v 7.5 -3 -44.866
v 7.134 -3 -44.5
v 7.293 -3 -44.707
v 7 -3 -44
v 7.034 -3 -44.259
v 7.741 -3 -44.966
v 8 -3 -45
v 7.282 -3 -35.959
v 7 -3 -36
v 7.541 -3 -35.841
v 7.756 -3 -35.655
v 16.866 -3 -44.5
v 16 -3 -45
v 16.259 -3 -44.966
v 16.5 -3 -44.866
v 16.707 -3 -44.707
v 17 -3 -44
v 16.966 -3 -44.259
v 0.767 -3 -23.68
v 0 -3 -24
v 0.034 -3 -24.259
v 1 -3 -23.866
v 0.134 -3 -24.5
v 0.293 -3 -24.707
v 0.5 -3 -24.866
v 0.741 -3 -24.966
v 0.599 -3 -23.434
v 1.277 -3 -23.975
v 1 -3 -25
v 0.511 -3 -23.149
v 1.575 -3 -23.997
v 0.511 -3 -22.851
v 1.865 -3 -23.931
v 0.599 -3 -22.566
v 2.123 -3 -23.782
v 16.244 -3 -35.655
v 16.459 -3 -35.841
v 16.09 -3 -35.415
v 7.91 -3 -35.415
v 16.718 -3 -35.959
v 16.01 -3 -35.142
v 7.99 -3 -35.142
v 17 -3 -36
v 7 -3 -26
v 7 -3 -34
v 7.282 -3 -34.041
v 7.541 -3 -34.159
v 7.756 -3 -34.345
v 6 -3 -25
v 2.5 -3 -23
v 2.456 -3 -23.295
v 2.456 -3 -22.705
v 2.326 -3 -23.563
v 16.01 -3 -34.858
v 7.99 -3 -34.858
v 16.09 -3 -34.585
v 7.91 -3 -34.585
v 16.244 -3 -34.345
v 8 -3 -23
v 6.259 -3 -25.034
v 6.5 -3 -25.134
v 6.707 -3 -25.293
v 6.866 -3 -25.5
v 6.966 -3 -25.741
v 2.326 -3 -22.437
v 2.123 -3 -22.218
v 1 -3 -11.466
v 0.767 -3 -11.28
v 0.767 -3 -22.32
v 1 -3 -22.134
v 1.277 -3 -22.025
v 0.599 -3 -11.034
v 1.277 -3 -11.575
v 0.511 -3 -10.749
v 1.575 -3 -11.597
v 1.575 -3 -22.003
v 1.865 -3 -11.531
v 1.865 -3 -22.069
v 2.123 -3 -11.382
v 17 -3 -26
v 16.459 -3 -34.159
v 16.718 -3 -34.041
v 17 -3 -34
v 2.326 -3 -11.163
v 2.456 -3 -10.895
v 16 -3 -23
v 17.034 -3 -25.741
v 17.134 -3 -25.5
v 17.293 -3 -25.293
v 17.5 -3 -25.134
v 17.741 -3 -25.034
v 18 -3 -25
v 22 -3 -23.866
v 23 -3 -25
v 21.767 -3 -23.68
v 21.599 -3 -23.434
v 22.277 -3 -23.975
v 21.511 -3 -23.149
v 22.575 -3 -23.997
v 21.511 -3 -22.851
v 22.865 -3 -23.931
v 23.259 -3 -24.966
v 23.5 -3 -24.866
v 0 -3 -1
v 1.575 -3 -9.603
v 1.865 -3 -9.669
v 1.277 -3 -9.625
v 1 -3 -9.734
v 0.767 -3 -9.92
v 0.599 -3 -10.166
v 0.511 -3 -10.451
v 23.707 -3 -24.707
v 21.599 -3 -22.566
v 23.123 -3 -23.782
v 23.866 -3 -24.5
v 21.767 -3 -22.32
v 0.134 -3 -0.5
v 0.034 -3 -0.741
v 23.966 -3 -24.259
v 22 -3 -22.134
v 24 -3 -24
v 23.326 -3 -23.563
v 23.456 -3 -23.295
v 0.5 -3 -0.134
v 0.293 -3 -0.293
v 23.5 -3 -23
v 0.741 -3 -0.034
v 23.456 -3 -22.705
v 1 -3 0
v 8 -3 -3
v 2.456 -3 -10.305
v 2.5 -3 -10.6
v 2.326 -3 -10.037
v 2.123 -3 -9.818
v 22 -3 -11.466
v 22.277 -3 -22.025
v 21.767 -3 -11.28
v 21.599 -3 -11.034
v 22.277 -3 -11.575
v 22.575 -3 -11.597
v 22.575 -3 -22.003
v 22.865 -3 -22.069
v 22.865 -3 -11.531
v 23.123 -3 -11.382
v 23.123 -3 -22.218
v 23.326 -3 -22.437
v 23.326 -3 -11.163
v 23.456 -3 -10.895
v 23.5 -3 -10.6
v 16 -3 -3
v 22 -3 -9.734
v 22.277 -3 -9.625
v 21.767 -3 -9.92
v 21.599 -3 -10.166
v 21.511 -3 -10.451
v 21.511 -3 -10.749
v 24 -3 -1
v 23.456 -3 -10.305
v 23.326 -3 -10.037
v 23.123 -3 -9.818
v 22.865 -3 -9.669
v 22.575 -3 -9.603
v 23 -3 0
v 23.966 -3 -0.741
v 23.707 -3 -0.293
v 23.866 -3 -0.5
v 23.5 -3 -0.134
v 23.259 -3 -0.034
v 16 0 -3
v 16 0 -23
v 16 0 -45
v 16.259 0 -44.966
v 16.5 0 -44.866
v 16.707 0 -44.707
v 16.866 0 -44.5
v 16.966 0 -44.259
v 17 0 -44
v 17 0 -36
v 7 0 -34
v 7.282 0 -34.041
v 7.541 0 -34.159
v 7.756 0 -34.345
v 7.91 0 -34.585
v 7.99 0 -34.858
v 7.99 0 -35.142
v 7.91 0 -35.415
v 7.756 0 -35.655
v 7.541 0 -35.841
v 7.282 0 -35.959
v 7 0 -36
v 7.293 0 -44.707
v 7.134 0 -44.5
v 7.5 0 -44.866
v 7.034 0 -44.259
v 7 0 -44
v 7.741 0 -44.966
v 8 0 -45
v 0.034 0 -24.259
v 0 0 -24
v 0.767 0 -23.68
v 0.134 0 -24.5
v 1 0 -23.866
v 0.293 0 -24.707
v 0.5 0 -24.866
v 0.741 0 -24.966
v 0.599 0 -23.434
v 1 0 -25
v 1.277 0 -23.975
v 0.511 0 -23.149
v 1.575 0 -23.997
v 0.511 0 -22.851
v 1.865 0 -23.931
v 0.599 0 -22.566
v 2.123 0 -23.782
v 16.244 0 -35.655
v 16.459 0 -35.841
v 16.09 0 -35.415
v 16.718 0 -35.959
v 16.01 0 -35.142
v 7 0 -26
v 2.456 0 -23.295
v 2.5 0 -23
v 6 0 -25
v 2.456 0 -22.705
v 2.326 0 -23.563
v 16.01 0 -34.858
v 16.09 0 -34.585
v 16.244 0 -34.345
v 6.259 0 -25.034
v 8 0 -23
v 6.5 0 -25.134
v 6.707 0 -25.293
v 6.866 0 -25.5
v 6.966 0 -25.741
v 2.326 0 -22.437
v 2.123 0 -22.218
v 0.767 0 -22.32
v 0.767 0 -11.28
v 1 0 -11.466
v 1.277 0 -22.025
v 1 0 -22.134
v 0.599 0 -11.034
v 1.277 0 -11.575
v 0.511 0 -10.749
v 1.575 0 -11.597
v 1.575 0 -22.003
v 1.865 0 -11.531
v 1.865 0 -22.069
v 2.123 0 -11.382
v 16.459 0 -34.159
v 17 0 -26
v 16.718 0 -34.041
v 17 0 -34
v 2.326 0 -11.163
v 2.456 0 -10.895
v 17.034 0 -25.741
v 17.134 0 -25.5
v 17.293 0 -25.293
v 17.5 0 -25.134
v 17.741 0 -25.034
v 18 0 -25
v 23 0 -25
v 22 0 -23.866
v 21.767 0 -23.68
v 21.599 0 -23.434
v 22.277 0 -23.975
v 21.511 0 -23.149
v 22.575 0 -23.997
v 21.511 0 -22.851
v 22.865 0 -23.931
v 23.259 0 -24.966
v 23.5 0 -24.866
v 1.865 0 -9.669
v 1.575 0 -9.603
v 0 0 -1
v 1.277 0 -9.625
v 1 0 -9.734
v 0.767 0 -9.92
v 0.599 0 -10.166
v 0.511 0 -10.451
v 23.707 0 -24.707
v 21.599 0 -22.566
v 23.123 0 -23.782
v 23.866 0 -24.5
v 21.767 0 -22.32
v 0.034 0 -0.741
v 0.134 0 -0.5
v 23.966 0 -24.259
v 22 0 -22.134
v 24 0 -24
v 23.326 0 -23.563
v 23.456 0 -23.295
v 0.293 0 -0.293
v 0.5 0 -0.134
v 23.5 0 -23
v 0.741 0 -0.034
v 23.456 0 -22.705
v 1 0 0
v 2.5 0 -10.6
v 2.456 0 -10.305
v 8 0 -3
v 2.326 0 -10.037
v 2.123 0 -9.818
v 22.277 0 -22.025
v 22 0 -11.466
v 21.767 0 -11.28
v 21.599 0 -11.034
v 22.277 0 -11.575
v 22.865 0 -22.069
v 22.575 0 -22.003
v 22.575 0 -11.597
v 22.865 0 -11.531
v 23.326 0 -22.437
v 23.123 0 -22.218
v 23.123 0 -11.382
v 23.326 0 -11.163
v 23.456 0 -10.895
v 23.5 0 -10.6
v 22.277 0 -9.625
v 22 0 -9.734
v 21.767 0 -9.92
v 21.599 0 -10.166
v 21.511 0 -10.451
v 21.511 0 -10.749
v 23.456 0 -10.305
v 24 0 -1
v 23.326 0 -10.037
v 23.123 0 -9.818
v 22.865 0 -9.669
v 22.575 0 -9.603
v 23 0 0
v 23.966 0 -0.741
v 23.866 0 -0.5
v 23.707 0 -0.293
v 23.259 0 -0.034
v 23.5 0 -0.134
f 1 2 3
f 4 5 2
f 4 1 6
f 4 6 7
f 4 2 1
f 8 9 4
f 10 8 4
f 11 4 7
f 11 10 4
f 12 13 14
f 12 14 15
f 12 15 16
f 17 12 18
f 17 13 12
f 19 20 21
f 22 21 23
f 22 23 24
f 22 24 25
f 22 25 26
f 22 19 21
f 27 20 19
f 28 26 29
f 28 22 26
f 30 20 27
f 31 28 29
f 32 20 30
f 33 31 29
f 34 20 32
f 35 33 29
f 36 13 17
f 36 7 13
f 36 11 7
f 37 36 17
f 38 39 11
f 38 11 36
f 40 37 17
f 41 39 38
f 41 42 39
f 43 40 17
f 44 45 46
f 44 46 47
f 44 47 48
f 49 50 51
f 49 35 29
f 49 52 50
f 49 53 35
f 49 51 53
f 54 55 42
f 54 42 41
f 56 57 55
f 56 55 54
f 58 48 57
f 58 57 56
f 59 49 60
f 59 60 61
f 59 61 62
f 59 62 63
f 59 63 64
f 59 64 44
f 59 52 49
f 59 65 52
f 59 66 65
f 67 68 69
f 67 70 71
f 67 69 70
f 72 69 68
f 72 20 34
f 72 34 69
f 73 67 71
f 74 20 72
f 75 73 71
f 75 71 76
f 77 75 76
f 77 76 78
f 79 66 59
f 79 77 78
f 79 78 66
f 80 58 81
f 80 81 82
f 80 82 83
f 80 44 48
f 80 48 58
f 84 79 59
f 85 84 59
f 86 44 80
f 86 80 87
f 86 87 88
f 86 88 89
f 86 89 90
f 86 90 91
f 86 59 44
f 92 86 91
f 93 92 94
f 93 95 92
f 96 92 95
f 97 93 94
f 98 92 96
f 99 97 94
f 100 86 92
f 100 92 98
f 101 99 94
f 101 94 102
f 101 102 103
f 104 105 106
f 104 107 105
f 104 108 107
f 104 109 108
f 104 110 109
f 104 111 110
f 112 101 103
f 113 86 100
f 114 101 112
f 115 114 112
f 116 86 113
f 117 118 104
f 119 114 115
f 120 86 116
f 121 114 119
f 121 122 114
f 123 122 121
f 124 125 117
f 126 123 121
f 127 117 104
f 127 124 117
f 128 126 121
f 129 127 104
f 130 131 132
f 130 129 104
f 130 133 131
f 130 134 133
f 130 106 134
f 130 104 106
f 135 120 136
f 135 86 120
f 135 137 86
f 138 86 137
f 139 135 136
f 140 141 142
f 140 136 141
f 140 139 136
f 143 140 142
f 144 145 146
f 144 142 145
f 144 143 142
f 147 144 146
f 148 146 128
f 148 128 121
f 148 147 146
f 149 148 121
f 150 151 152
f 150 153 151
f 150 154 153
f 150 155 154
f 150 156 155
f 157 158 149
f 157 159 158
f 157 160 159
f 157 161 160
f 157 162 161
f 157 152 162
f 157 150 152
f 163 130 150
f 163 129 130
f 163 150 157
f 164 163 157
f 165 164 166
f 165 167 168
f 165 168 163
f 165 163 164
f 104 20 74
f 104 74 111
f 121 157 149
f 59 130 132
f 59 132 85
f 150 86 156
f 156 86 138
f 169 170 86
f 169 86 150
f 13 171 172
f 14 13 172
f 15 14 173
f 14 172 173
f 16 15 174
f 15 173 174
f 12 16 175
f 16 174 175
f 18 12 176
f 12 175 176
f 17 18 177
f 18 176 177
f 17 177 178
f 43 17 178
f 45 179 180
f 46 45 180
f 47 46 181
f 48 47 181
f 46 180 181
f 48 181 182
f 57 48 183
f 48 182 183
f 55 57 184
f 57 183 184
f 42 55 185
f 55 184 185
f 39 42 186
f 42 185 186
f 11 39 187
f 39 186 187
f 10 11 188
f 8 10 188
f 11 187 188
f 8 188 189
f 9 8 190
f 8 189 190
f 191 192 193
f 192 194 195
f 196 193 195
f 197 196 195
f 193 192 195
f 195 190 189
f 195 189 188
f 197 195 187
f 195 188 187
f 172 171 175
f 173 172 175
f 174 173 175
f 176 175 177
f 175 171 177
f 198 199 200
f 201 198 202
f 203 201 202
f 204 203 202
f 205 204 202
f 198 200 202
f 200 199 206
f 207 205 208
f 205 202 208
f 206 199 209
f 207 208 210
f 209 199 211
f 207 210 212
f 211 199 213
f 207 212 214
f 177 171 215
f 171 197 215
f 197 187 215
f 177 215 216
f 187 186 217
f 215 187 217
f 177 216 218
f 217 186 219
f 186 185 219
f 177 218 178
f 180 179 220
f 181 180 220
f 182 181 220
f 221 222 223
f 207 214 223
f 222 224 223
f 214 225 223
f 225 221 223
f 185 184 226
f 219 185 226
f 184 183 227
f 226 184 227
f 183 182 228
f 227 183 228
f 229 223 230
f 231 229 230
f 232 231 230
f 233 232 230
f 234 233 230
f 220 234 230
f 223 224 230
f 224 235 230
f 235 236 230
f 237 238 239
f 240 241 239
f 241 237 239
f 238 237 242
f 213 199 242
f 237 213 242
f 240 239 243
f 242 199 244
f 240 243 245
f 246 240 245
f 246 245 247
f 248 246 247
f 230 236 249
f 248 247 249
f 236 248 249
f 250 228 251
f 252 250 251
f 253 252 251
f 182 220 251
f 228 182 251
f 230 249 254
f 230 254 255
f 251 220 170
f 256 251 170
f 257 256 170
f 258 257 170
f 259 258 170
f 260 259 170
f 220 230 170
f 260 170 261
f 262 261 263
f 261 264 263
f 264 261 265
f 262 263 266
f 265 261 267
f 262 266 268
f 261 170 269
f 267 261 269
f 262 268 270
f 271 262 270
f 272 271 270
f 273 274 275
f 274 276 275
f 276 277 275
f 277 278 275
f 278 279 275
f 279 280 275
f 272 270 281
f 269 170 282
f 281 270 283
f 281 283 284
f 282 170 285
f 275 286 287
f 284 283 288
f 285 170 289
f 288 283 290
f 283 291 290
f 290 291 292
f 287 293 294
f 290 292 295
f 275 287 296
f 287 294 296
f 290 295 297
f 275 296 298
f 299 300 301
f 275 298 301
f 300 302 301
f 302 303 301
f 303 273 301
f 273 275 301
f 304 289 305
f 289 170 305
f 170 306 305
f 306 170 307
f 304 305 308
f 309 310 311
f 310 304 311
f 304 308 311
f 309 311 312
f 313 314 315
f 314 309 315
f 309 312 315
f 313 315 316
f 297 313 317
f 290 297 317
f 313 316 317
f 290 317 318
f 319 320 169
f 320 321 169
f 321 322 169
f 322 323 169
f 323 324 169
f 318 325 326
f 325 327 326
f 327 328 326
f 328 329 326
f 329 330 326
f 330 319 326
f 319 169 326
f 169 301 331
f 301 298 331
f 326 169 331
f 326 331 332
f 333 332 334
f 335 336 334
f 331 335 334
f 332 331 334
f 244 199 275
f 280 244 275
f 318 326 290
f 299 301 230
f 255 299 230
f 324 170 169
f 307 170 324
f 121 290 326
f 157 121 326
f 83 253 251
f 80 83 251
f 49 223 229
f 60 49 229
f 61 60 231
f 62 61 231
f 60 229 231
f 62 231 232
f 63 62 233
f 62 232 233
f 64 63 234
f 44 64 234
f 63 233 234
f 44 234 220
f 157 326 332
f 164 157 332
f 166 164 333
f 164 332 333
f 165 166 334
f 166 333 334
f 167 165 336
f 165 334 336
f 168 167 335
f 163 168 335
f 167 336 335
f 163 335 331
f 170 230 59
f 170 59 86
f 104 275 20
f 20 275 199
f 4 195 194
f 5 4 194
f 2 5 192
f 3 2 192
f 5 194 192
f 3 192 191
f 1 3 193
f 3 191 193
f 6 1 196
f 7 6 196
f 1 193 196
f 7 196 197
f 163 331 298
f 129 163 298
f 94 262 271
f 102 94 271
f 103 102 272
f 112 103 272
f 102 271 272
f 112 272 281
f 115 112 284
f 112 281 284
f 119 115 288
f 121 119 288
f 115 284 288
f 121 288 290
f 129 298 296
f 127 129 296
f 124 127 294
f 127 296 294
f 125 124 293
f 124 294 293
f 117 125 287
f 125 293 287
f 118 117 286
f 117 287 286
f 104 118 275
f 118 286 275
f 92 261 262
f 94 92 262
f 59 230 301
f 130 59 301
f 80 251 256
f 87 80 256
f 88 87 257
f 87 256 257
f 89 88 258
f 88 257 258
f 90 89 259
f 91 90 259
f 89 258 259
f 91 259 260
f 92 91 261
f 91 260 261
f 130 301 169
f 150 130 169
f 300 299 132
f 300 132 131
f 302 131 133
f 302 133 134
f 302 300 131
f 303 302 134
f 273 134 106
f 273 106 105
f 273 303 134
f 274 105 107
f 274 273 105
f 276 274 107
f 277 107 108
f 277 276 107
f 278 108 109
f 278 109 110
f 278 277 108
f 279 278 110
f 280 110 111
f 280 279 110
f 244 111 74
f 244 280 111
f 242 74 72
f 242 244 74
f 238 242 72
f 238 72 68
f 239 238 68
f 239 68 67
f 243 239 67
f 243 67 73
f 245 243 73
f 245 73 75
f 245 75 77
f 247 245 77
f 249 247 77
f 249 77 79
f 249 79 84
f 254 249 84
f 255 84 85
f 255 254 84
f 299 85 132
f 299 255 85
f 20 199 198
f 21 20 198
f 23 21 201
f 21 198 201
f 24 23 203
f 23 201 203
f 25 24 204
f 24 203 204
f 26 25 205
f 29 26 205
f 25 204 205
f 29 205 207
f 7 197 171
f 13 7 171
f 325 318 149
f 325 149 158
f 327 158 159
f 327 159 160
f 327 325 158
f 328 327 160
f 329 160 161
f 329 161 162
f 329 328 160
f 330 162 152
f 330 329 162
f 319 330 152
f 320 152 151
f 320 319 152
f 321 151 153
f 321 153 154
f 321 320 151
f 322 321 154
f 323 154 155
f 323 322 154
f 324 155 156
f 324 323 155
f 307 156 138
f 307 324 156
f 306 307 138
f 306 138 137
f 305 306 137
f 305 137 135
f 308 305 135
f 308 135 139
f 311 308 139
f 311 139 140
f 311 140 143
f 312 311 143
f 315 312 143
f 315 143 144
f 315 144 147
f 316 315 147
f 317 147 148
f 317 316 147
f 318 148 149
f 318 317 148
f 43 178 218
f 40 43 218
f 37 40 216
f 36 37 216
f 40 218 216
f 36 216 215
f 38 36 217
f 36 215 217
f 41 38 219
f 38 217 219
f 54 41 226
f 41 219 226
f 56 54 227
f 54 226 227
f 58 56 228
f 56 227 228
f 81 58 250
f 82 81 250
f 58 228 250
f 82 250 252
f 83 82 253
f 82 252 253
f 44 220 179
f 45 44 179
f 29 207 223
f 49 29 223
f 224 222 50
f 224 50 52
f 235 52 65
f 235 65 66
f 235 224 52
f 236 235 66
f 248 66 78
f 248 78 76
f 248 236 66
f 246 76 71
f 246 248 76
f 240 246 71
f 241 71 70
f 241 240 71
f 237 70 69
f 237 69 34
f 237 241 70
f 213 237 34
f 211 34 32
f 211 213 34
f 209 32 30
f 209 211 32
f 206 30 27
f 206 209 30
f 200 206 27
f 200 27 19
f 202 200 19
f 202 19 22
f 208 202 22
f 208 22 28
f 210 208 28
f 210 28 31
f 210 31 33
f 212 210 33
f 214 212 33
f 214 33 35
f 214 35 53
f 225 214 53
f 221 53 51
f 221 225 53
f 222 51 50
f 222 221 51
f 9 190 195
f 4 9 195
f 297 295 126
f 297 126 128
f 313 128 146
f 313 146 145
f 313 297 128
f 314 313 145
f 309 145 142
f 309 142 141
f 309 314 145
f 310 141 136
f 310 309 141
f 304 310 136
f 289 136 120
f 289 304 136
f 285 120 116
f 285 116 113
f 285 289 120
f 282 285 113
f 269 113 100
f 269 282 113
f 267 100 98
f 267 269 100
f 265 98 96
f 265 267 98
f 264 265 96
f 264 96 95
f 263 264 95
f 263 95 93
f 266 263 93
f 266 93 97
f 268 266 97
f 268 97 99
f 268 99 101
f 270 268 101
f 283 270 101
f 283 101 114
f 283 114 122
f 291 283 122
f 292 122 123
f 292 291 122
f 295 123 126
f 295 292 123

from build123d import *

# Parameters (mm, degrees)
F0_R     = 1
F0_W     = 8
F0_H     = 20
F1_DEPTH = 3


with BuildPart() as f1:
    # F0 (on Front) → F1 (new body)
    with BuildSketch(Plane.XZ):
        with BuildLine():
            Line((23, 1e-06), (1, 0))
            ThreePointArc((1, 0), (0.292893, -0.292893), (0, -1))
            Line((0, -1), (0, -23.999999))
            ThreePointArc((0, -23.999999), (0.292893, -24.707106), (1, -24.999999))
            Line((1, -24.999999), (6, -24.999999))
            ThreePointArc((6, -24.999999), (6.707107, -25.292892), (7, -25.999999))
            Line((7, -25.999999), (7, -33.999999))
            ThreePointArc((7, -33.999999), (8, -34.999999), (7, -35.999999))
            Line((7, -35.999999), (7, -43.999999))
            ThreePointArc((7, -43.999999), (7.292893, -44.707106), (8, -44.999999))
            Line((8, -44.999999), (16, -44.999999))
            ThreePointArc((16, -44.999999), (16.707107, -44.707106), (17, -43.999999))
            Line((17, -43.999999), (17, -35.999999))
            ThreePointArc((17, -35.999999), (16, -34.999999), (17, -33.999999))
            Line((17, -33.999999), (17, -25.999999))
            ThreePointArc((17, -25.999999), (17.292893, -25.292892), (18, -24.999999))
            Line((18, -24.999999), (23, -24.999999))
            ThreePointArc((23, -24.999999), (23.707107, -24.707106), (24, -23.999999))
            Line((24, -23.999999), (24, -0.999999))
            ThreePointArc((24, -0.999999), (23.707107, -0.292892), (23, 1e-06))
        make_face()
        with Locations((1.5, -22.999999)):
            Circle(F0_R, mode=Mode.SUBTRACT)
        with Locations((22.5, -22.999999)):
            Circle(F0_R, mode=Mode.SUBTRACT)
        with Locations((1.5, -10.599999)):
            Circle(F0_R, mode=Mode.SUBTRACT)
        with Locations((12, -13)):
            Rectangle(F0_W, F0_H, mode=Mode.SUBTRACT)
        with Locations((22.5, -10.599999)):
            Circle(F0_R, mode=Mode.SUBTRACT)
    extrude(amount=F1_DEPTH)


solid = f1.part
